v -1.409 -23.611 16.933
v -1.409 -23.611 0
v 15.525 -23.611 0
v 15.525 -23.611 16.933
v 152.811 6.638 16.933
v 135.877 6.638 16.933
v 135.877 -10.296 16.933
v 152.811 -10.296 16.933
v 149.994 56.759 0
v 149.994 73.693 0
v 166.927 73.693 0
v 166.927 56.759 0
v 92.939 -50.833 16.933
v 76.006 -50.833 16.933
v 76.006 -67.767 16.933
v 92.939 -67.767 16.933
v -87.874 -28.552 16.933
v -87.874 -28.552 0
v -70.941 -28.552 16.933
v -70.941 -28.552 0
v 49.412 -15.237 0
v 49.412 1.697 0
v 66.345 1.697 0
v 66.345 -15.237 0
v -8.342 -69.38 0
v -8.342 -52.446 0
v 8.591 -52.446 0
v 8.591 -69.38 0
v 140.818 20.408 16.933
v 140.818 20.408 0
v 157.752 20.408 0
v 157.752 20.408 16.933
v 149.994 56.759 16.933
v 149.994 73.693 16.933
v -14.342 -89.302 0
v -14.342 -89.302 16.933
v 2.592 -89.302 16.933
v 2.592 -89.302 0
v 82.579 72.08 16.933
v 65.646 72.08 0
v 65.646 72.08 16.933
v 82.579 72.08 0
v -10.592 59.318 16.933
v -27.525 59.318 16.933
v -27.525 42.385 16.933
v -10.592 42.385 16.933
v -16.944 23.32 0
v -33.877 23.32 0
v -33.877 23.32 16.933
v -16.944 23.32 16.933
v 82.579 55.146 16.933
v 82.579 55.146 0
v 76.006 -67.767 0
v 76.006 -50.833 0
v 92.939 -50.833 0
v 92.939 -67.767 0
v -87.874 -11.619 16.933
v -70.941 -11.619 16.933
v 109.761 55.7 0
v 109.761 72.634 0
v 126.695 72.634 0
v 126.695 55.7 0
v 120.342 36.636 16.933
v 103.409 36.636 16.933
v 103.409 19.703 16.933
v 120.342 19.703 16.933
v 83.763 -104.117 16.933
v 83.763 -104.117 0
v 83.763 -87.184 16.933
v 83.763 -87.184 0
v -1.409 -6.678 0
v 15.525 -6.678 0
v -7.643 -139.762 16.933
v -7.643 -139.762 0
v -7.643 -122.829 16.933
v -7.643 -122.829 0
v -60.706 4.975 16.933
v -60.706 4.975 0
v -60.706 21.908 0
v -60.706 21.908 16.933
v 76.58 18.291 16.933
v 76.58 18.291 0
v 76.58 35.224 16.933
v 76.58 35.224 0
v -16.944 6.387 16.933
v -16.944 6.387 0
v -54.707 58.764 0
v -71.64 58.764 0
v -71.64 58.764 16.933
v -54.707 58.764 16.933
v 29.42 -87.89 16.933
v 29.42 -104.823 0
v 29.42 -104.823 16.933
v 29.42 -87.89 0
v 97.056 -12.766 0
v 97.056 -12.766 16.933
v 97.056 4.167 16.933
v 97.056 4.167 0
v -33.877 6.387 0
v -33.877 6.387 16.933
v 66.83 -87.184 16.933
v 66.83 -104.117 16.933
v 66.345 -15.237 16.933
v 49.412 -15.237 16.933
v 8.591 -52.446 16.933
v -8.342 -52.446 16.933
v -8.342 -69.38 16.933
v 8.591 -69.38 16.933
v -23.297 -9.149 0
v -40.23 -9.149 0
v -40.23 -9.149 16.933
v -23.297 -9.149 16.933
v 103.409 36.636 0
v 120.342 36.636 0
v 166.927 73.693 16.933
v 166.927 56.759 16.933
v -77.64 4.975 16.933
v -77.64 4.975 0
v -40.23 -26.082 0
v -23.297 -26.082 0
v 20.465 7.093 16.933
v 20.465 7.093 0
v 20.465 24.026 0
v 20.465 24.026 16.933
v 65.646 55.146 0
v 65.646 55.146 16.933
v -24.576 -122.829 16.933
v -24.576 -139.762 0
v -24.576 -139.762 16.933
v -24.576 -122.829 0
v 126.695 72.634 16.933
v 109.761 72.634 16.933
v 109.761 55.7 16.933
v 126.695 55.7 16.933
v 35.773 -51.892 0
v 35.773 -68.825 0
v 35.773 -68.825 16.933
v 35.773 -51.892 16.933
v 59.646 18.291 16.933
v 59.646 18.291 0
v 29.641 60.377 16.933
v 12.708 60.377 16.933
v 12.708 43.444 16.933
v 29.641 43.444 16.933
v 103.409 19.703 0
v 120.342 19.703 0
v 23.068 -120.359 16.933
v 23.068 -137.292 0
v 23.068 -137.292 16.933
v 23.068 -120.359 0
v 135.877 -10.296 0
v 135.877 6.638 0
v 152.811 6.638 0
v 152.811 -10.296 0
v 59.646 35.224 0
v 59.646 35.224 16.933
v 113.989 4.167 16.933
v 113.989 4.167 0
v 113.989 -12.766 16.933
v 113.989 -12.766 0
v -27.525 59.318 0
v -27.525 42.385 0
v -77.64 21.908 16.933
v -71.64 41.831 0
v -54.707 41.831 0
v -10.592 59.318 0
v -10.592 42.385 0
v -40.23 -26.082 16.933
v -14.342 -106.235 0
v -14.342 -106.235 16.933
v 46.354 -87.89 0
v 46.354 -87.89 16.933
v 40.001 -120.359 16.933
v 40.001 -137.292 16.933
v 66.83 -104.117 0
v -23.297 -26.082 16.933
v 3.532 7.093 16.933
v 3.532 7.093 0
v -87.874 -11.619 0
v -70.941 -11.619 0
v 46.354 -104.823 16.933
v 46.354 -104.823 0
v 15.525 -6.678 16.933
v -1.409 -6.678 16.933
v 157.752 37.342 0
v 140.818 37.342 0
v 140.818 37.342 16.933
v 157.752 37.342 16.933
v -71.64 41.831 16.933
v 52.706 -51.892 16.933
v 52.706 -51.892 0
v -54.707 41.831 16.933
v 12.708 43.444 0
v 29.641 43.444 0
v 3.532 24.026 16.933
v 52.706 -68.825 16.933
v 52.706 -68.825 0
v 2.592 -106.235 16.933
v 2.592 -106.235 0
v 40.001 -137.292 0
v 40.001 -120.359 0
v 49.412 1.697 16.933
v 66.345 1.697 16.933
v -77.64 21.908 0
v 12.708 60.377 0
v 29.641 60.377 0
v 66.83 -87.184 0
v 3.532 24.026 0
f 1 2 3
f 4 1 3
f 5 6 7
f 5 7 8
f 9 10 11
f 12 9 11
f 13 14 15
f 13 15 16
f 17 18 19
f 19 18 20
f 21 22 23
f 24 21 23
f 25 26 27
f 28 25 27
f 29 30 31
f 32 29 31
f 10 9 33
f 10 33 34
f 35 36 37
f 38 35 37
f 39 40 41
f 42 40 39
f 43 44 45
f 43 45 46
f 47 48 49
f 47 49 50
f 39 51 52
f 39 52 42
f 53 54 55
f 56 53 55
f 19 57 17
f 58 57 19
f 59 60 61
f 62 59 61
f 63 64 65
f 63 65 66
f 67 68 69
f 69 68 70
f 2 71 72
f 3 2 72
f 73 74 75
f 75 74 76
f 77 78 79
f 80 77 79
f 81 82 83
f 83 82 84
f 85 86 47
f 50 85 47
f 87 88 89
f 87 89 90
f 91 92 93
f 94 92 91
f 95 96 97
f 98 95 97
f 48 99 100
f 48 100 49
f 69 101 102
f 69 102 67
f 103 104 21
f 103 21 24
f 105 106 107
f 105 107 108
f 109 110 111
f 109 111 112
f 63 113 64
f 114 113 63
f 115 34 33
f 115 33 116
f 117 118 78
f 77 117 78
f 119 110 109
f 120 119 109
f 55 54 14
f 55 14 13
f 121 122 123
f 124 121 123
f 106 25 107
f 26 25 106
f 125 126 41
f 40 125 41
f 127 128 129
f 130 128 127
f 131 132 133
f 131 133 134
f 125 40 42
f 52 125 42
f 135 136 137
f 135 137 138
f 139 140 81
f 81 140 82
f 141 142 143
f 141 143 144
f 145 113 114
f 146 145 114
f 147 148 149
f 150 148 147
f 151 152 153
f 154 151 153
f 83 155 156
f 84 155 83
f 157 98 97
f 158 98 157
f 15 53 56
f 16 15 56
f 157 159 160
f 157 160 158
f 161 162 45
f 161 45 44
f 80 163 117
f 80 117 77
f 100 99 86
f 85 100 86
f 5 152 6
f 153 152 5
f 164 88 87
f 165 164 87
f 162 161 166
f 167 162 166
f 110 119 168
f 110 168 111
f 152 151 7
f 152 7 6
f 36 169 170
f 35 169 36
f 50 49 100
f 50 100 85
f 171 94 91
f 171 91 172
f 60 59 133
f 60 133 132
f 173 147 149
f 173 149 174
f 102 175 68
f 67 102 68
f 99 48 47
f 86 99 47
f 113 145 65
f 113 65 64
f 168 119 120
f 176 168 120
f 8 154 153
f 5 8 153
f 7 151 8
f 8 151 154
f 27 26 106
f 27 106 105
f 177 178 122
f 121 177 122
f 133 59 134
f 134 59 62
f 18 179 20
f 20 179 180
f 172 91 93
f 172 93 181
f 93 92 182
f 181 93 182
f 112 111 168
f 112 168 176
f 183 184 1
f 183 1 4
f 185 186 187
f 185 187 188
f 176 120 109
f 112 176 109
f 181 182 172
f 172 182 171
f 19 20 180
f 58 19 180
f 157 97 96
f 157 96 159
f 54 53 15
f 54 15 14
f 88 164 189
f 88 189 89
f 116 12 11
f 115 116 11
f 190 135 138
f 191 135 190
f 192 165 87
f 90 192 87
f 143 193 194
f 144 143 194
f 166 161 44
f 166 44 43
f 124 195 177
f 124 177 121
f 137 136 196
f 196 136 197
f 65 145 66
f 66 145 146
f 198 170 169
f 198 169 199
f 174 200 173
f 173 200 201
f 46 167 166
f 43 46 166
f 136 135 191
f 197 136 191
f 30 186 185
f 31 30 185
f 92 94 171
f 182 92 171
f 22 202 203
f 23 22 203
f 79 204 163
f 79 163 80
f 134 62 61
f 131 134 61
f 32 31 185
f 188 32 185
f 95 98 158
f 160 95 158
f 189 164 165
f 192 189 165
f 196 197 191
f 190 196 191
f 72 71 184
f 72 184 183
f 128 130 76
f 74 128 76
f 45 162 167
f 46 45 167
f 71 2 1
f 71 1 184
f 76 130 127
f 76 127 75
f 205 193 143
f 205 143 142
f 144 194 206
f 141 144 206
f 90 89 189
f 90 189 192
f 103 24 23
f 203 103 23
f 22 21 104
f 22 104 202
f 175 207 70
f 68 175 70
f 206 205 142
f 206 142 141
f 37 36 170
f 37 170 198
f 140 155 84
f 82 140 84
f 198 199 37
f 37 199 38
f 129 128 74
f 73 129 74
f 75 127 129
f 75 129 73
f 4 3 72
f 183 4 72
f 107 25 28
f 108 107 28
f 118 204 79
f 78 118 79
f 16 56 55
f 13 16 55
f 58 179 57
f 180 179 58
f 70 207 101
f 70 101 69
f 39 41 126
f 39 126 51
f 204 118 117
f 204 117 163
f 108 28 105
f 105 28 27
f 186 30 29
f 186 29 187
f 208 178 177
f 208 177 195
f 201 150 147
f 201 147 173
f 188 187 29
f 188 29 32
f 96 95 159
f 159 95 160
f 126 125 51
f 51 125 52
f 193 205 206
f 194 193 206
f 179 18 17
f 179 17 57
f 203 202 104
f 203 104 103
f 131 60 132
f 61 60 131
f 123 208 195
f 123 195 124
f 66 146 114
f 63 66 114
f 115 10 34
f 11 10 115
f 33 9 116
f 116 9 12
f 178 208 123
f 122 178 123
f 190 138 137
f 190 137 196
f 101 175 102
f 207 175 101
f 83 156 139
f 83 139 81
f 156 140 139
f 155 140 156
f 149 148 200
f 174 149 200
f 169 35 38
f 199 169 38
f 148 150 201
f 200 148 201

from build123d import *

# Parameters (mm, degrees)
F0_W     = 16.933334
F0_H     = 16.933334
F0_W_2   = 16.933333
F0_H_2   = 16.933333
F1_DEPTH = 16.933333


with BuildPart() as f1:
    # F0 (on Top) → F1 (new body)
    with BuildSketch(Plane.XY):
        with Locations((-63.173309, 50.297189)):
            Rectangle(F0_W, F0_H)
        with Locations((-19.058235, 50.851412)):
            Rectangle(F0_W, F0_H)
        with Locations((21.174712, 51.910173)):
            Rectangle(F0_W, F0_H)
        with Locations((-69.172956, 13.441829)):
            Rectangle(F0_W, F0_H)
        with Locations((-25.410806, 14.853512)):
            Rectangle(F0_W_2, F0_H)
        with Locations((11.998776, 15.559353)):
            Rectangle(F0_W_2, F0_H)
        with Locations((-79.407654, -20.085625)):
            Rectangle(F0_W_2, F0_H_2)
        with Locations((-31.763375, -17.615182)):
            Rectangle(F0_W, F0_H_2)
        with Locations((7.057888, -15.144738)):
            Rectangle(F0_W, F0_H_2)
        with Locations((74.112793, 63.612897)):
            Rectangle(F0_W_2, F0_H_2)
        with Locations((118.227868, 64.167121)):
            Rectangle(F0_W_2, F0_H)
        with Locations((158.460814, 65.225882)):
            Rectangle(F0_W_2, F0_H)
        with Locations((68.113146, 26.757537)):
            Rectangle(F0_W_2, F0_H_2)
        with Locations((111.875295, 28.16922)):
            Rectangle(F0_W_2, F0_H_2)
        with Locations((149.284879, 28.875061)):
            Rectangle(F0_W, F0_H_2)
        with Locations((57.878447, -6.769916)):
            Rectangle(F0_W_2, F0_H_2)
        with Locations((105.522728, -4.299473)):
            Rectangle(F0_W_2, F0_H_2)
        with Locations((144.34399, -1.829029)):
            Rectangle(F0_W_2, F0_H_2)
        with Locations((0.12452, -60.912975)):
            Rectangle(F0_W_2, F0_H_2)
        with Locations((44.239593, -60.358752)):
            Rectangle(F0_W_2, F0_H)
        with Locations((84.472541, -59.299991)):
            Rectangle(F0_W, F0_H)
        with Locations((-5.875127, -97.768335)):
            Rectangle(F0_W_2, F0_H_2)
        with Locations((37.887022, -96.356652)):
            Rectangle(F0_W, F0_H_2)
        with Locations((75.296605, -95.650812)):
            Rectangle(F0_W, F0_H_2)
        with Locations((-16.109826, -131.295789)):
            Rectangle(F0_W, F0_H_2)
        with Locations((31.534454, -128.825346)):
            Rectangle(F0_W, F0_H_2)
    extrude(amount=F1_DEPTH)


solid = f1.part
